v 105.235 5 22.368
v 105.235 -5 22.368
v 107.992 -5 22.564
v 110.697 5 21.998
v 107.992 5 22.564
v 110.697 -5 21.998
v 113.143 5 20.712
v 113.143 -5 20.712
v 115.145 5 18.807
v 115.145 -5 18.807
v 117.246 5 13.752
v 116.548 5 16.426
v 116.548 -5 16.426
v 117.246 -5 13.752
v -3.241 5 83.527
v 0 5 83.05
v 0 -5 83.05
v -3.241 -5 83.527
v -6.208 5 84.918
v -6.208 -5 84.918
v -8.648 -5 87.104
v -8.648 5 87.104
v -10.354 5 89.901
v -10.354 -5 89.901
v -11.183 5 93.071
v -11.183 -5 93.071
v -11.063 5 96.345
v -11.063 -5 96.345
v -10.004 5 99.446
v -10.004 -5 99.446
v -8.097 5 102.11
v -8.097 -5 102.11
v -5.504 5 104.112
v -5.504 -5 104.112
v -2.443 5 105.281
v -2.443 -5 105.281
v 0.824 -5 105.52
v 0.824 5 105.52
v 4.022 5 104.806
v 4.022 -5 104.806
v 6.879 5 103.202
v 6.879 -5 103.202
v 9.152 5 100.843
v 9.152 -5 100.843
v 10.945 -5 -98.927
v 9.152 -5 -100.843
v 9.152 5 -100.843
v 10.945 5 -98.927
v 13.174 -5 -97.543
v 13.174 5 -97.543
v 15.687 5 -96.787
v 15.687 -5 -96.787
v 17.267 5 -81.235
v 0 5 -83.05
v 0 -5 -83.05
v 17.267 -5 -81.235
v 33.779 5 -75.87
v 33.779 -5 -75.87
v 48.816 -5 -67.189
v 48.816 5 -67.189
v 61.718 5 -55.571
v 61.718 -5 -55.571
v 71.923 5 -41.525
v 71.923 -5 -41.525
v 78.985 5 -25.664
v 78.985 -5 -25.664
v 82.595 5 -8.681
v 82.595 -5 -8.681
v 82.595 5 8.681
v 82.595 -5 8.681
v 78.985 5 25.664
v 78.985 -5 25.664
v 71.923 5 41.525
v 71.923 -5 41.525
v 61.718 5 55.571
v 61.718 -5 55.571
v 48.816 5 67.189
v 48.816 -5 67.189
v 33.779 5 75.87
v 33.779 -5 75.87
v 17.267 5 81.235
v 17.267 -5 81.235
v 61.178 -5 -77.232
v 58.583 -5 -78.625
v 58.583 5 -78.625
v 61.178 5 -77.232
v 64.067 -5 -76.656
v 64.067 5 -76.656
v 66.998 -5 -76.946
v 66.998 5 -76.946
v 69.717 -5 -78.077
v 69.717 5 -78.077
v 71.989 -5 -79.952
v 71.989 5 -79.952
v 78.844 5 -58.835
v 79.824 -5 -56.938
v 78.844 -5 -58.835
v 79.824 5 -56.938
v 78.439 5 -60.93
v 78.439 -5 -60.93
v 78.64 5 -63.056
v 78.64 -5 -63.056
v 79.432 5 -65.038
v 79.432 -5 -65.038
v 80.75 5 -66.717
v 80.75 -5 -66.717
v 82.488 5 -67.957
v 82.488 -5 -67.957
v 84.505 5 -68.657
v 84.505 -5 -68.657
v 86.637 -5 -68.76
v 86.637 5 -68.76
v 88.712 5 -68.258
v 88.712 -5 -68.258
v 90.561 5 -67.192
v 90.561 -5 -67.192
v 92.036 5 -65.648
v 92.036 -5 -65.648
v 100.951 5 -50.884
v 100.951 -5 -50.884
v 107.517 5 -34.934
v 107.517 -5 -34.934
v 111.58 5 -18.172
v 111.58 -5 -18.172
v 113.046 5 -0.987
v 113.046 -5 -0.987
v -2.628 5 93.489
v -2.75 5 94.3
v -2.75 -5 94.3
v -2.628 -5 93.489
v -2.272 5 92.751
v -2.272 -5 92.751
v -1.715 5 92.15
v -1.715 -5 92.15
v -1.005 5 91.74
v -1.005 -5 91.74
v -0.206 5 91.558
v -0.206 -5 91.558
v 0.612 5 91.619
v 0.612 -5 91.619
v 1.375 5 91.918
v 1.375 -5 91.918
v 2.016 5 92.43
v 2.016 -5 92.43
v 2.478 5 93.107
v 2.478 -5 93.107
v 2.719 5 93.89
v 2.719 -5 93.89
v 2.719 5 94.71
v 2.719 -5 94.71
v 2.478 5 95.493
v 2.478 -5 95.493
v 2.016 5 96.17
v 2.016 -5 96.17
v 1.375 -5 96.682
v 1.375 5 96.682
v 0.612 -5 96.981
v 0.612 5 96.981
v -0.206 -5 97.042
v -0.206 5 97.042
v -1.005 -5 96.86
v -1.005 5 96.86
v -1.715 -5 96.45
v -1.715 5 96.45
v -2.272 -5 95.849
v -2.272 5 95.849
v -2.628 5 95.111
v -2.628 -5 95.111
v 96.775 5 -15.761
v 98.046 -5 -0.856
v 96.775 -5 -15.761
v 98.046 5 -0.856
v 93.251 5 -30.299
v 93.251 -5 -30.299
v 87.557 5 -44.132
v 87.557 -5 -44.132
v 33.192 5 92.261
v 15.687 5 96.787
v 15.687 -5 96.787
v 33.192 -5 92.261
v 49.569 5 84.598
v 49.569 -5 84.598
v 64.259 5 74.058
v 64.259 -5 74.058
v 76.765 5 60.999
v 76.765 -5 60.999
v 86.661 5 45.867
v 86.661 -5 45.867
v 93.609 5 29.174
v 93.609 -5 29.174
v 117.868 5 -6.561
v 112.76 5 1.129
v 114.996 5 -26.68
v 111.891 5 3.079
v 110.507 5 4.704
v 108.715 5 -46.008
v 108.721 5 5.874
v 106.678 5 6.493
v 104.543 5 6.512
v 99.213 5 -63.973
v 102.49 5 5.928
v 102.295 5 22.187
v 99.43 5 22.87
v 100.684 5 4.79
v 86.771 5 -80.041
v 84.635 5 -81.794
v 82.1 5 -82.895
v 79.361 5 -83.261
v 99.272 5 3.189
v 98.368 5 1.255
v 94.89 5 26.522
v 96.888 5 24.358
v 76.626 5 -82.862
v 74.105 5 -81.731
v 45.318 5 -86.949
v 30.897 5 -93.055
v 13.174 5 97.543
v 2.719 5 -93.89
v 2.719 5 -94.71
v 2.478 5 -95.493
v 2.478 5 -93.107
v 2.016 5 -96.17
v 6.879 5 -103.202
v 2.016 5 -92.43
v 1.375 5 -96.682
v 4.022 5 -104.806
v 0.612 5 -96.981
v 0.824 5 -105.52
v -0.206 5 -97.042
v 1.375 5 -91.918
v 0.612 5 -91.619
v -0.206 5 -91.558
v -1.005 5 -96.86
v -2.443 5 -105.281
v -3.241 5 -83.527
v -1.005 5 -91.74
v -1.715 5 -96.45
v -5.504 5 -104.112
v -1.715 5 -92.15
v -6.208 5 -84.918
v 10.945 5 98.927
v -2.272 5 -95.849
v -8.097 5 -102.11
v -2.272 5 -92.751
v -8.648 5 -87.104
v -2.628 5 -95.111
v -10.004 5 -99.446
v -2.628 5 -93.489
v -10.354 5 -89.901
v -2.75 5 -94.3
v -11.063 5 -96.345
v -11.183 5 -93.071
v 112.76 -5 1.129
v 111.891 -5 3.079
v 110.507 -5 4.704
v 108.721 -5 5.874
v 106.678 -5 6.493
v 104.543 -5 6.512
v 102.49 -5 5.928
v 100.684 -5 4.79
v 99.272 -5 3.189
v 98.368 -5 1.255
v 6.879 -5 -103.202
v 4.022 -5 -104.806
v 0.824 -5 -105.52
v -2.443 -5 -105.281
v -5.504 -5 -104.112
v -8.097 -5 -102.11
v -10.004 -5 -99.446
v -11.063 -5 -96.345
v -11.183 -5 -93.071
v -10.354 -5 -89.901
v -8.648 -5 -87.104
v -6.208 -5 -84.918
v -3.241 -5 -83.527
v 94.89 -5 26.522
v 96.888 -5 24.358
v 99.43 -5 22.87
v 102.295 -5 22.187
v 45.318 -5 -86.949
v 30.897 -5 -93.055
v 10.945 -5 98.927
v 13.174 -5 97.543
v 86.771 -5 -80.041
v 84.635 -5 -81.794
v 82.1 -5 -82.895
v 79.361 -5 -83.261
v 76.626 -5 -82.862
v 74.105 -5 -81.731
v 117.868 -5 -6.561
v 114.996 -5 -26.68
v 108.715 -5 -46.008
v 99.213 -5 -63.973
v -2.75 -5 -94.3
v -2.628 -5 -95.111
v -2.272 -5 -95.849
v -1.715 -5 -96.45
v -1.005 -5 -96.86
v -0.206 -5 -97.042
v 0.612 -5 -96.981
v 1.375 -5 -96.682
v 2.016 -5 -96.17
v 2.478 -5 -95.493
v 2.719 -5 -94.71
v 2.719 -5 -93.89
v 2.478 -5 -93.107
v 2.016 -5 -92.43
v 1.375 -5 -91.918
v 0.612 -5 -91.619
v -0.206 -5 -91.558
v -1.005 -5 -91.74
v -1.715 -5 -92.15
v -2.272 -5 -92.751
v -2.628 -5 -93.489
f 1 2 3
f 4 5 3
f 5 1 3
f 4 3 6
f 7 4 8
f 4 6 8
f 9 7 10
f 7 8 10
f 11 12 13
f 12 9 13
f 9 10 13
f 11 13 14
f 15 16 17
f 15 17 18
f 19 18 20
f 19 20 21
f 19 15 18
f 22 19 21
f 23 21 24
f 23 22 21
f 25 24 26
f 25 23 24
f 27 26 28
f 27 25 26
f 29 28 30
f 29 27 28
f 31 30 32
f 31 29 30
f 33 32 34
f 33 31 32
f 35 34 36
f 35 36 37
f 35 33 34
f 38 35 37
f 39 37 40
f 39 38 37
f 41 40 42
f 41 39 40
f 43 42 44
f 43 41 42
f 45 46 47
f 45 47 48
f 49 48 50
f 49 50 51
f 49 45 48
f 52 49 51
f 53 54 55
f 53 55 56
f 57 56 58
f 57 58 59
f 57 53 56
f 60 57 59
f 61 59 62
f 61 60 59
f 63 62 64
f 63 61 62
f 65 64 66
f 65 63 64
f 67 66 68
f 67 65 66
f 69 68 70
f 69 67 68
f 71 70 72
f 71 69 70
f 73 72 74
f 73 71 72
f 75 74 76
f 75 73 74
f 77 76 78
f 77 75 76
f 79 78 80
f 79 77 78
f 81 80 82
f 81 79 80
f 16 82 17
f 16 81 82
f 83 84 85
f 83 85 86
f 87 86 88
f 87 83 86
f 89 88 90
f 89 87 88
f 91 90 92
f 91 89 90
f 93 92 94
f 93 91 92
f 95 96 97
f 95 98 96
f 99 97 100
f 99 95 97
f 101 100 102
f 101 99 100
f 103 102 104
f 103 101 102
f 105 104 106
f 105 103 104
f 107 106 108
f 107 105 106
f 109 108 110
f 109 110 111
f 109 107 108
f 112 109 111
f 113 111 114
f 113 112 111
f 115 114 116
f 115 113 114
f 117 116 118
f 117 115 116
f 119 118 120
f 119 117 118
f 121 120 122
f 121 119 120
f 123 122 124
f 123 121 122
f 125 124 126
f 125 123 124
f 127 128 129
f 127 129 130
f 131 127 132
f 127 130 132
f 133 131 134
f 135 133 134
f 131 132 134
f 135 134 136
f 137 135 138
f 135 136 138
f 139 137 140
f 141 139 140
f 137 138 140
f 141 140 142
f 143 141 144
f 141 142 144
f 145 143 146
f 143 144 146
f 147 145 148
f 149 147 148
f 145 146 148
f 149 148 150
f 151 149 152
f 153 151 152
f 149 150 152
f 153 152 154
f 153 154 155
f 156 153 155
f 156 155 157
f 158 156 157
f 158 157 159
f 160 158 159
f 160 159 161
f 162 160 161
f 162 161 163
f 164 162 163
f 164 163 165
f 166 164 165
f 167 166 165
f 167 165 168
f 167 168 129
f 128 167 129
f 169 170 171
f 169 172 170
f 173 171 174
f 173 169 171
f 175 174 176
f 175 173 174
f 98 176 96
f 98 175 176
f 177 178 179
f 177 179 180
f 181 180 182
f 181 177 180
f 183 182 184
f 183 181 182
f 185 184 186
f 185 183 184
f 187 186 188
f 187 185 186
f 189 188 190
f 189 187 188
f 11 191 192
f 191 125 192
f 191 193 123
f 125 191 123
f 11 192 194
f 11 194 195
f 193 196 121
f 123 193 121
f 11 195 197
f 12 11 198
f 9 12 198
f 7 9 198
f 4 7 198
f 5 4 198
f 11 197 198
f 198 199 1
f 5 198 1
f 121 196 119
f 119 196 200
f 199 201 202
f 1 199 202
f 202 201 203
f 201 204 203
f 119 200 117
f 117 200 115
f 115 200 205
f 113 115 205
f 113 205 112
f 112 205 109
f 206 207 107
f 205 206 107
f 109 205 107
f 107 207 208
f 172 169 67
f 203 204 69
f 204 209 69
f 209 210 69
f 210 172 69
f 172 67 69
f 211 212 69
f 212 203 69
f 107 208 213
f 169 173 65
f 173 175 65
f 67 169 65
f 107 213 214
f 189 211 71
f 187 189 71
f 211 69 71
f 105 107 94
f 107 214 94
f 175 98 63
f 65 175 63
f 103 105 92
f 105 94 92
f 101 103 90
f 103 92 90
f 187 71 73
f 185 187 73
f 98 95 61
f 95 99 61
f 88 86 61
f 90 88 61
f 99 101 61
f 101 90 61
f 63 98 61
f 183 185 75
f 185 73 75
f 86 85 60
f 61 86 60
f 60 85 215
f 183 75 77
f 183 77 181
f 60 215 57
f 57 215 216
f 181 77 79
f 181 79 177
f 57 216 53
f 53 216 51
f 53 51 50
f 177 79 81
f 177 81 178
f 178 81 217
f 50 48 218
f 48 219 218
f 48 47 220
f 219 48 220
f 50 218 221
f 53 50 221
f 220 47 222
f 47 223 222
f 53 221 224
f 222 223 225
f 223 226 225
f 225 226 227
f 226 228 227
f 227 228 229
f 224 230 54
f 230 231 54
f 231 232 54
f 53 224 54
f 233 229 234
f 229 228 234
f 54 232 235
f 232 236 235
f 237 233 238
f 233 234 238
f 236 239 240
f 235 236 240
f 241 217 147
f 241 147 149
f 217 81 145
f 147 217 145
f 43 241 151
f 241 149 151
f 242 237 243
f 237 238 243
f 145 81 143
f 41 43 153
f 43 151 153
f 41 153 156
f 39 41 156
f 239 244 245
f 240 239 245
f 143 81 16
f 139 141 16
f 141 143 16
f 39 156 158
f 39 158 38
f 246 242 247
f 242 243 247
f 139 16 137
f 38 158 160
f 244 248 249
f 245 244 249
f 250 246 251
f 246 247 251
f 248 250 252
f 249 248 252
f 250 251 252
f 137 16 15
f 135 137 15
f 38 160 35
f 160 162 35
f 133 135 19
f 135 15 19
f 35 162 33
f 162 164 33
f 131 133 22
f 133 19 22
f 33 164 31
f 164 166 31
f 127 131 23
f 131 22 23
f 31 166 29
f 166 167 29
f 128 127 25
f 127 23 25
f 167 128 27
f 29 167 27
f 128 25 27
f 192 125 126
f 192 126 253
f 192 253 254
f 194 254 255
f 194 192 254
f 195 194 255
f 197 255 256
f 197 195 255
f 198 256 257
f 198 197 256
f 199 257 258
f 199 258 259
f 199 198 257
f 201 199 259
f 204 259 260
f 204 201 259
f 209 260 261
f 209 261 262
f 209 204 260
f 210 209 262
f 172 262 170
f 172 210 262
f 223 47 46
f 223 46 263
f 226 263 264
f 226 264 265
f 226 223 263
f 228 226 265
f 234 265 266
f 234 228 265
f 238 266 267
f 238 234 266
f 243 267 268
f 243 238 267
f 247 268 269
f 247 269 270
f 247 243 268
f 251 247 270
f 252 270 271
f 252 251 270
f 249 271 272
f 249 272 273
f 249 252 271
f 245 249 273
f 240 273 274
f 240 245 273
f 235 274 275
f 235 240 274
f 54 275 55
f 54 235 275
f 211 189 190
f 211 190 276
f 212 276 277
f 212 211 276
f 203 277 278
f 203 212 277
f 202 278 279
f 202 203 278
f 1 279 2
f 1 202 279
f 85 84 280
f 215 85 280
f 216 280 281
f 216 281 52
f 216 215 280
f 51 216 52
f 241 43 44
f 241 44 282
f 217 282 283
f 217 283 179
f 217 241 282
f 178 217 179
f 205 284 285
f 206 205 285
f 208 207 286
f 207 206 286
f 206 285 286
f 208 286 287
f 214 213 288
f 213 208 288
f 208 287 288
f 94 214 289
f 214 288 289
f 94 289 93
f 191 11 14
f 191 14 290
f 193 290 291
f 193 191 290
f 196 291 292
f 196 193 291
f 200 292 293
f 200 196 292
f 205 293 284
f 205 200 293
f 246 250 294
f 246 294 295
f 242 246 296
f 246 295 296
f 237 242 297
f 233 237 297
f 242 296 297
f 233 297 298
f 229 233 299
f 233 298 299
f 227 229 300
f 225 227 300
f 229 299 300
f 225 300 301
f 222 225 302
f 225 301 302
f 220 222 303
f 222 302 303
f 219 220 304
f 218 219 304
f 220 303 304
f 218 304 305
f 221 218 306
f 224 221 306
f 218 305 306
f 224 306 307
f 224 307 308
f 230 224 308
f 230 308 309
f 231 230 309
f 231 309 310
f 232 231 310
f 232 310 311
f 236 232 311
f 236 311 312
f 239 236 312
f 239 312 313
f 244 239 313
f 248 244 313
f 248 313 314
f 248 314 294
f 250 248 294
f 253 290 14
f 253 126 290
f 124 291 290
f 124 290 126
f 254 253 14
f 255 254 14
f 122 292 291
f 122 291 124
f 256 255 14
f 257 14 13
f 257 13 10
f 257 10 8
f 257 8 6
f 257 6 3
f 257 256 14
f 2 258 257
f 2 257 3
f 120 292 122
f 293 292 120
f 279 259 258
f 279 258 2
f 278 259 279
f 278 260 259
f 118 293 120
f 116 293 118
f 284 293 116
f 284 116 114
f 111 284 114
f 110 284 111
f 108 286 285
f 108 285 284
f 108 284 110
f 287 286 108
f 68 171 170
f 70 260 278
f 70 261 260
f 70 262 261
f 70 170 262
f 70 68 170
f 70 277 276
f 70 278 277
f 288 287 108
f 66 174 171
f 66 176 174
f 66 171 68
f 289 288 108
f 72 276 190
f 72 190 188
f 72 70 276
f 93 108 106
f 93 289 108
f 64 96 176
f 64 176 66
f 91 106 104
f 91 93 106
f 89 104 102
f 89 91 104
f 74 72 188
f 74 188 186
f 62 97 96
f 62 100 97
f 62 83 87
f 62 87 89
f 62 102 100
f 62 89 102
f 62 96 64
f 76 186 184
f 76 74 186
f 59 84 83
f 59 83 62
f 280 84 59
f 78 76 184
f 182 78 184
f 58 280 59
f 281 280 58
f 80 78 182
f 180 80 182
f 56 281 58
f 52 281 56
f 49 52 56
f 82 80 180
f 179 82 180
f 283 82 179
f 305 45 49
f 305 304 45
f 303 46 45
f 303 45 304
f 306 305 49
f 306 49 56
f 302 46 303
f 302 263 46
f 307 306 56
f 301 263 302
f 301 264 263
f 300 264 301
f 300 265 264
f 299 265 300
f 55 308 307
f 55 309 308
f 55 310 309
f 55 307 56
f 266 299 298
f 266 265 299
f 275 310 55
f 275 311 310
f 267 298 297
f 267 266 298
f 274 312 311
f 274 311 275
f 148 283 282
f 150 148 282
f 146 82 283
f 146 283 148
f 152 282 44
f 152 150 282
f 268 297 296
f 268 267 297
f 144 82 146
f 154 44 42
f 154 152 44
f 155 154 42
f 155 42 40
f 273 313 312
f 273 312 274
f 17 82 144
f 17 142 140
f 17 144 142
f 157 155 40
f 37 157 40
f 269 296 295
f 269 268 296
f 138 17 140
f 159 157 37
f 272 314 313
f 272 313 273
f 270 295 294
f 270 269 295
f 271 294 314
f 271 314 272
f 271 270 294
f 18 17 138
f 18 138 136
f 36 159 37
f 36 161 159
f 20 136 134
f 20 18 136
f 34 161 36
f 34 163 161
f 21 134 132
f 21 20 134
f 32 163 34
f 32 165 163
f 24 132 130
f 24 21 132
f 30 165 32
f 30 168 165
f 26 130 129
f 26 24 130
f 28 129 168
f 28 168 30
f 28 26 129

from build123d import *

# Parameters (mm, degrees)
BOSS_EXTRUDE1_DEPTH  = 5
M5_CLEARANCE_HOLE1_D = 5.5
FILLET1_R            = 10


with BuildPart() as part:
    # Sketch1 → Boss-Extrude1 (new, symmetric)
    with BuildSketch(Plane(origin=(0, 0, 0), x_dir=(1, 0, 0), z_dir=(0, 1, 0))):
        with BuildLine():
            ThreePointArc((115.470324267, -24.543975101), (112.272221749, 36.479456186), (78.990868081, 87.728246648))
            Line((78.990868081, 87.728246648), (65.608255953, 72.865350138))
            ThreePointArc((65.608255953, 72.865350138), (40.133036877, 89.460280857), (10.798978706, 97.45349947))
            ThreePointArc((10.798978706, 97.45349947), (-9.001093518, 101.04854173), (0, 83.05))
            ThreePointArc((0, 83.05), (83.05, 0), (0, -83.05))
            ThreePointArc((0, -83.05), (-9.001093518, -101.04854173), (10.798978706, -97.45349947))
            ThreePointArc((10.798978706, -97.45349947), (65.813533347, -72.679992628), (95.907372252, -20.385741285))
            Line((95.907372252, -20.385741285), (115.470324267, -24.543975101))
        make_face()
        with BuildLine():
            ThreePointArc((113.045695402, 0.986534838), (105.611429996, -6.578628601), (98.046266556, 0.855636806))
            ThreePointArc((98.046266556, 0.855636806), (93.251091423, 30.299116298), (79.824026575, 56.937924807))
            ThreePointArc((79.824026575, 56.937924807), (81.574620795, 67.399063363), (92.03575935, 65.648469143))
            ThreePointArc((92.03575935, 65.648469143), (107.516939167, 34.934371214), (113.045695402, 0.986534838))
        make_face(mode=Mode.SUBTRACT)
    extrude(amount=BOSS_EXTRUDE1_DEPTH, both=True)

    # M5 Clearance Hole1 (through all)
    with Locations(Plane(origin=(0, 5, 0), x_dir=(1, 0, 0), z_dir=(0, 1, 0))):
        with Locations((0, -94.3), (0, 94.3)):
            Hole(M5_CLEARANCE_HOLE1_D / 2)

    # Fillet1
    # the kernel refuses this fillet: 10 mm, written as the material it adds along each edge
    with BuildSketch(Plane(origin=(10.798978706, 5, 97.45349947), x_dir=(0.990831071127436, 0, -0.13510658195831074), z_dir=(0, -1, 0)), Plane(origin=(10.798978706, -5, -97.45349947), x_dir=(0.990831071127436, 0, 0.13510658195831213), z_dir=(0, 1, 0))) as fillet1_piece_1:
        with BuildLine():
            CenterArc((5.184861326, 9.996835122), FILLET1_R, 223.325173882, 45.233283105)
            ThreePointArc((-2.089852288, 3.13545466), (-0.912718127, 1.655846999), (0, 0))
            ThreePointArc((0, 0), (2.466645575, 0.031031634), (4.93329115, 0))
        make_face()
    extrude(amount=10)
    with BuildSketch(Plane(origin=(65.608255953, -5, -72.865350138), x_dir=(0.6691306063588537, 0, -0.7431448254773984), z_dir=(0, 1, 0)), Plane(origin=(95.907372252, 5, 20.385741285), x_dir=(0.9781476007338056, 0, 0.20791169081775965), z_dir=(0, -1, 0))) as fillet1_piece_2:
        with BuildLine():
            CenterArc((9.536256092, 10), FILLET1_R, 185.31030916, 84.68969084)
            ThreePointArc((-0.420824527, 9.074502545), (-0.105262635, 4.542127523), (0, 0))
            Line((0, 0), (9.536256092, 0))
        make_face()
    extrude(amount=10)
    # the kernel refuses this fillet: 10 mm, written as the material it takes off along each edge
    with BuildSketch(Plane(origin=(78.990868081, -32.343098115, -87.728246648), x_dir=(0.7113498032891118, 0, 0.7028381444973957), z_dir=(0, 1, 0))) as fillet1_2_piece_1:
        with BuildLine():
            CenterArc((10.473993196, -9.989264392), FILLET1_R, 87.34484542, 95.31030916)
            Line((0.484728804, -10.452510442), (0, 0))
            ThreePointArc((0, 0), (5.468619623, 0.12673385), (10.937239246, 0))
        make_face()
    extrude(amount=64.68619623, mode=Mode.SUBTRACT)
    with BuildSketch(Plane(origin=(115.470324267, -32.343098115, 24.543975101), x_dir=(-0.9781476007338059, 0, -0.2079116908177584), z_dir=(0, 1, 0))) as fillet1_2_piece_2:
        with BuildLine():
            CenterArc((10.463743908, -10), FILLET1_R, 90, 95.31030916)
            ThreePointArc((0.506663288, -10.925497455), (0.12673385, -5.468619623), (0, 0))
            Line((0, 0), (10.463743908, 0))
        make_face()
    extrude(amount=64.68619623, mode=Mode.SUBTRACT)


solid = part.part
